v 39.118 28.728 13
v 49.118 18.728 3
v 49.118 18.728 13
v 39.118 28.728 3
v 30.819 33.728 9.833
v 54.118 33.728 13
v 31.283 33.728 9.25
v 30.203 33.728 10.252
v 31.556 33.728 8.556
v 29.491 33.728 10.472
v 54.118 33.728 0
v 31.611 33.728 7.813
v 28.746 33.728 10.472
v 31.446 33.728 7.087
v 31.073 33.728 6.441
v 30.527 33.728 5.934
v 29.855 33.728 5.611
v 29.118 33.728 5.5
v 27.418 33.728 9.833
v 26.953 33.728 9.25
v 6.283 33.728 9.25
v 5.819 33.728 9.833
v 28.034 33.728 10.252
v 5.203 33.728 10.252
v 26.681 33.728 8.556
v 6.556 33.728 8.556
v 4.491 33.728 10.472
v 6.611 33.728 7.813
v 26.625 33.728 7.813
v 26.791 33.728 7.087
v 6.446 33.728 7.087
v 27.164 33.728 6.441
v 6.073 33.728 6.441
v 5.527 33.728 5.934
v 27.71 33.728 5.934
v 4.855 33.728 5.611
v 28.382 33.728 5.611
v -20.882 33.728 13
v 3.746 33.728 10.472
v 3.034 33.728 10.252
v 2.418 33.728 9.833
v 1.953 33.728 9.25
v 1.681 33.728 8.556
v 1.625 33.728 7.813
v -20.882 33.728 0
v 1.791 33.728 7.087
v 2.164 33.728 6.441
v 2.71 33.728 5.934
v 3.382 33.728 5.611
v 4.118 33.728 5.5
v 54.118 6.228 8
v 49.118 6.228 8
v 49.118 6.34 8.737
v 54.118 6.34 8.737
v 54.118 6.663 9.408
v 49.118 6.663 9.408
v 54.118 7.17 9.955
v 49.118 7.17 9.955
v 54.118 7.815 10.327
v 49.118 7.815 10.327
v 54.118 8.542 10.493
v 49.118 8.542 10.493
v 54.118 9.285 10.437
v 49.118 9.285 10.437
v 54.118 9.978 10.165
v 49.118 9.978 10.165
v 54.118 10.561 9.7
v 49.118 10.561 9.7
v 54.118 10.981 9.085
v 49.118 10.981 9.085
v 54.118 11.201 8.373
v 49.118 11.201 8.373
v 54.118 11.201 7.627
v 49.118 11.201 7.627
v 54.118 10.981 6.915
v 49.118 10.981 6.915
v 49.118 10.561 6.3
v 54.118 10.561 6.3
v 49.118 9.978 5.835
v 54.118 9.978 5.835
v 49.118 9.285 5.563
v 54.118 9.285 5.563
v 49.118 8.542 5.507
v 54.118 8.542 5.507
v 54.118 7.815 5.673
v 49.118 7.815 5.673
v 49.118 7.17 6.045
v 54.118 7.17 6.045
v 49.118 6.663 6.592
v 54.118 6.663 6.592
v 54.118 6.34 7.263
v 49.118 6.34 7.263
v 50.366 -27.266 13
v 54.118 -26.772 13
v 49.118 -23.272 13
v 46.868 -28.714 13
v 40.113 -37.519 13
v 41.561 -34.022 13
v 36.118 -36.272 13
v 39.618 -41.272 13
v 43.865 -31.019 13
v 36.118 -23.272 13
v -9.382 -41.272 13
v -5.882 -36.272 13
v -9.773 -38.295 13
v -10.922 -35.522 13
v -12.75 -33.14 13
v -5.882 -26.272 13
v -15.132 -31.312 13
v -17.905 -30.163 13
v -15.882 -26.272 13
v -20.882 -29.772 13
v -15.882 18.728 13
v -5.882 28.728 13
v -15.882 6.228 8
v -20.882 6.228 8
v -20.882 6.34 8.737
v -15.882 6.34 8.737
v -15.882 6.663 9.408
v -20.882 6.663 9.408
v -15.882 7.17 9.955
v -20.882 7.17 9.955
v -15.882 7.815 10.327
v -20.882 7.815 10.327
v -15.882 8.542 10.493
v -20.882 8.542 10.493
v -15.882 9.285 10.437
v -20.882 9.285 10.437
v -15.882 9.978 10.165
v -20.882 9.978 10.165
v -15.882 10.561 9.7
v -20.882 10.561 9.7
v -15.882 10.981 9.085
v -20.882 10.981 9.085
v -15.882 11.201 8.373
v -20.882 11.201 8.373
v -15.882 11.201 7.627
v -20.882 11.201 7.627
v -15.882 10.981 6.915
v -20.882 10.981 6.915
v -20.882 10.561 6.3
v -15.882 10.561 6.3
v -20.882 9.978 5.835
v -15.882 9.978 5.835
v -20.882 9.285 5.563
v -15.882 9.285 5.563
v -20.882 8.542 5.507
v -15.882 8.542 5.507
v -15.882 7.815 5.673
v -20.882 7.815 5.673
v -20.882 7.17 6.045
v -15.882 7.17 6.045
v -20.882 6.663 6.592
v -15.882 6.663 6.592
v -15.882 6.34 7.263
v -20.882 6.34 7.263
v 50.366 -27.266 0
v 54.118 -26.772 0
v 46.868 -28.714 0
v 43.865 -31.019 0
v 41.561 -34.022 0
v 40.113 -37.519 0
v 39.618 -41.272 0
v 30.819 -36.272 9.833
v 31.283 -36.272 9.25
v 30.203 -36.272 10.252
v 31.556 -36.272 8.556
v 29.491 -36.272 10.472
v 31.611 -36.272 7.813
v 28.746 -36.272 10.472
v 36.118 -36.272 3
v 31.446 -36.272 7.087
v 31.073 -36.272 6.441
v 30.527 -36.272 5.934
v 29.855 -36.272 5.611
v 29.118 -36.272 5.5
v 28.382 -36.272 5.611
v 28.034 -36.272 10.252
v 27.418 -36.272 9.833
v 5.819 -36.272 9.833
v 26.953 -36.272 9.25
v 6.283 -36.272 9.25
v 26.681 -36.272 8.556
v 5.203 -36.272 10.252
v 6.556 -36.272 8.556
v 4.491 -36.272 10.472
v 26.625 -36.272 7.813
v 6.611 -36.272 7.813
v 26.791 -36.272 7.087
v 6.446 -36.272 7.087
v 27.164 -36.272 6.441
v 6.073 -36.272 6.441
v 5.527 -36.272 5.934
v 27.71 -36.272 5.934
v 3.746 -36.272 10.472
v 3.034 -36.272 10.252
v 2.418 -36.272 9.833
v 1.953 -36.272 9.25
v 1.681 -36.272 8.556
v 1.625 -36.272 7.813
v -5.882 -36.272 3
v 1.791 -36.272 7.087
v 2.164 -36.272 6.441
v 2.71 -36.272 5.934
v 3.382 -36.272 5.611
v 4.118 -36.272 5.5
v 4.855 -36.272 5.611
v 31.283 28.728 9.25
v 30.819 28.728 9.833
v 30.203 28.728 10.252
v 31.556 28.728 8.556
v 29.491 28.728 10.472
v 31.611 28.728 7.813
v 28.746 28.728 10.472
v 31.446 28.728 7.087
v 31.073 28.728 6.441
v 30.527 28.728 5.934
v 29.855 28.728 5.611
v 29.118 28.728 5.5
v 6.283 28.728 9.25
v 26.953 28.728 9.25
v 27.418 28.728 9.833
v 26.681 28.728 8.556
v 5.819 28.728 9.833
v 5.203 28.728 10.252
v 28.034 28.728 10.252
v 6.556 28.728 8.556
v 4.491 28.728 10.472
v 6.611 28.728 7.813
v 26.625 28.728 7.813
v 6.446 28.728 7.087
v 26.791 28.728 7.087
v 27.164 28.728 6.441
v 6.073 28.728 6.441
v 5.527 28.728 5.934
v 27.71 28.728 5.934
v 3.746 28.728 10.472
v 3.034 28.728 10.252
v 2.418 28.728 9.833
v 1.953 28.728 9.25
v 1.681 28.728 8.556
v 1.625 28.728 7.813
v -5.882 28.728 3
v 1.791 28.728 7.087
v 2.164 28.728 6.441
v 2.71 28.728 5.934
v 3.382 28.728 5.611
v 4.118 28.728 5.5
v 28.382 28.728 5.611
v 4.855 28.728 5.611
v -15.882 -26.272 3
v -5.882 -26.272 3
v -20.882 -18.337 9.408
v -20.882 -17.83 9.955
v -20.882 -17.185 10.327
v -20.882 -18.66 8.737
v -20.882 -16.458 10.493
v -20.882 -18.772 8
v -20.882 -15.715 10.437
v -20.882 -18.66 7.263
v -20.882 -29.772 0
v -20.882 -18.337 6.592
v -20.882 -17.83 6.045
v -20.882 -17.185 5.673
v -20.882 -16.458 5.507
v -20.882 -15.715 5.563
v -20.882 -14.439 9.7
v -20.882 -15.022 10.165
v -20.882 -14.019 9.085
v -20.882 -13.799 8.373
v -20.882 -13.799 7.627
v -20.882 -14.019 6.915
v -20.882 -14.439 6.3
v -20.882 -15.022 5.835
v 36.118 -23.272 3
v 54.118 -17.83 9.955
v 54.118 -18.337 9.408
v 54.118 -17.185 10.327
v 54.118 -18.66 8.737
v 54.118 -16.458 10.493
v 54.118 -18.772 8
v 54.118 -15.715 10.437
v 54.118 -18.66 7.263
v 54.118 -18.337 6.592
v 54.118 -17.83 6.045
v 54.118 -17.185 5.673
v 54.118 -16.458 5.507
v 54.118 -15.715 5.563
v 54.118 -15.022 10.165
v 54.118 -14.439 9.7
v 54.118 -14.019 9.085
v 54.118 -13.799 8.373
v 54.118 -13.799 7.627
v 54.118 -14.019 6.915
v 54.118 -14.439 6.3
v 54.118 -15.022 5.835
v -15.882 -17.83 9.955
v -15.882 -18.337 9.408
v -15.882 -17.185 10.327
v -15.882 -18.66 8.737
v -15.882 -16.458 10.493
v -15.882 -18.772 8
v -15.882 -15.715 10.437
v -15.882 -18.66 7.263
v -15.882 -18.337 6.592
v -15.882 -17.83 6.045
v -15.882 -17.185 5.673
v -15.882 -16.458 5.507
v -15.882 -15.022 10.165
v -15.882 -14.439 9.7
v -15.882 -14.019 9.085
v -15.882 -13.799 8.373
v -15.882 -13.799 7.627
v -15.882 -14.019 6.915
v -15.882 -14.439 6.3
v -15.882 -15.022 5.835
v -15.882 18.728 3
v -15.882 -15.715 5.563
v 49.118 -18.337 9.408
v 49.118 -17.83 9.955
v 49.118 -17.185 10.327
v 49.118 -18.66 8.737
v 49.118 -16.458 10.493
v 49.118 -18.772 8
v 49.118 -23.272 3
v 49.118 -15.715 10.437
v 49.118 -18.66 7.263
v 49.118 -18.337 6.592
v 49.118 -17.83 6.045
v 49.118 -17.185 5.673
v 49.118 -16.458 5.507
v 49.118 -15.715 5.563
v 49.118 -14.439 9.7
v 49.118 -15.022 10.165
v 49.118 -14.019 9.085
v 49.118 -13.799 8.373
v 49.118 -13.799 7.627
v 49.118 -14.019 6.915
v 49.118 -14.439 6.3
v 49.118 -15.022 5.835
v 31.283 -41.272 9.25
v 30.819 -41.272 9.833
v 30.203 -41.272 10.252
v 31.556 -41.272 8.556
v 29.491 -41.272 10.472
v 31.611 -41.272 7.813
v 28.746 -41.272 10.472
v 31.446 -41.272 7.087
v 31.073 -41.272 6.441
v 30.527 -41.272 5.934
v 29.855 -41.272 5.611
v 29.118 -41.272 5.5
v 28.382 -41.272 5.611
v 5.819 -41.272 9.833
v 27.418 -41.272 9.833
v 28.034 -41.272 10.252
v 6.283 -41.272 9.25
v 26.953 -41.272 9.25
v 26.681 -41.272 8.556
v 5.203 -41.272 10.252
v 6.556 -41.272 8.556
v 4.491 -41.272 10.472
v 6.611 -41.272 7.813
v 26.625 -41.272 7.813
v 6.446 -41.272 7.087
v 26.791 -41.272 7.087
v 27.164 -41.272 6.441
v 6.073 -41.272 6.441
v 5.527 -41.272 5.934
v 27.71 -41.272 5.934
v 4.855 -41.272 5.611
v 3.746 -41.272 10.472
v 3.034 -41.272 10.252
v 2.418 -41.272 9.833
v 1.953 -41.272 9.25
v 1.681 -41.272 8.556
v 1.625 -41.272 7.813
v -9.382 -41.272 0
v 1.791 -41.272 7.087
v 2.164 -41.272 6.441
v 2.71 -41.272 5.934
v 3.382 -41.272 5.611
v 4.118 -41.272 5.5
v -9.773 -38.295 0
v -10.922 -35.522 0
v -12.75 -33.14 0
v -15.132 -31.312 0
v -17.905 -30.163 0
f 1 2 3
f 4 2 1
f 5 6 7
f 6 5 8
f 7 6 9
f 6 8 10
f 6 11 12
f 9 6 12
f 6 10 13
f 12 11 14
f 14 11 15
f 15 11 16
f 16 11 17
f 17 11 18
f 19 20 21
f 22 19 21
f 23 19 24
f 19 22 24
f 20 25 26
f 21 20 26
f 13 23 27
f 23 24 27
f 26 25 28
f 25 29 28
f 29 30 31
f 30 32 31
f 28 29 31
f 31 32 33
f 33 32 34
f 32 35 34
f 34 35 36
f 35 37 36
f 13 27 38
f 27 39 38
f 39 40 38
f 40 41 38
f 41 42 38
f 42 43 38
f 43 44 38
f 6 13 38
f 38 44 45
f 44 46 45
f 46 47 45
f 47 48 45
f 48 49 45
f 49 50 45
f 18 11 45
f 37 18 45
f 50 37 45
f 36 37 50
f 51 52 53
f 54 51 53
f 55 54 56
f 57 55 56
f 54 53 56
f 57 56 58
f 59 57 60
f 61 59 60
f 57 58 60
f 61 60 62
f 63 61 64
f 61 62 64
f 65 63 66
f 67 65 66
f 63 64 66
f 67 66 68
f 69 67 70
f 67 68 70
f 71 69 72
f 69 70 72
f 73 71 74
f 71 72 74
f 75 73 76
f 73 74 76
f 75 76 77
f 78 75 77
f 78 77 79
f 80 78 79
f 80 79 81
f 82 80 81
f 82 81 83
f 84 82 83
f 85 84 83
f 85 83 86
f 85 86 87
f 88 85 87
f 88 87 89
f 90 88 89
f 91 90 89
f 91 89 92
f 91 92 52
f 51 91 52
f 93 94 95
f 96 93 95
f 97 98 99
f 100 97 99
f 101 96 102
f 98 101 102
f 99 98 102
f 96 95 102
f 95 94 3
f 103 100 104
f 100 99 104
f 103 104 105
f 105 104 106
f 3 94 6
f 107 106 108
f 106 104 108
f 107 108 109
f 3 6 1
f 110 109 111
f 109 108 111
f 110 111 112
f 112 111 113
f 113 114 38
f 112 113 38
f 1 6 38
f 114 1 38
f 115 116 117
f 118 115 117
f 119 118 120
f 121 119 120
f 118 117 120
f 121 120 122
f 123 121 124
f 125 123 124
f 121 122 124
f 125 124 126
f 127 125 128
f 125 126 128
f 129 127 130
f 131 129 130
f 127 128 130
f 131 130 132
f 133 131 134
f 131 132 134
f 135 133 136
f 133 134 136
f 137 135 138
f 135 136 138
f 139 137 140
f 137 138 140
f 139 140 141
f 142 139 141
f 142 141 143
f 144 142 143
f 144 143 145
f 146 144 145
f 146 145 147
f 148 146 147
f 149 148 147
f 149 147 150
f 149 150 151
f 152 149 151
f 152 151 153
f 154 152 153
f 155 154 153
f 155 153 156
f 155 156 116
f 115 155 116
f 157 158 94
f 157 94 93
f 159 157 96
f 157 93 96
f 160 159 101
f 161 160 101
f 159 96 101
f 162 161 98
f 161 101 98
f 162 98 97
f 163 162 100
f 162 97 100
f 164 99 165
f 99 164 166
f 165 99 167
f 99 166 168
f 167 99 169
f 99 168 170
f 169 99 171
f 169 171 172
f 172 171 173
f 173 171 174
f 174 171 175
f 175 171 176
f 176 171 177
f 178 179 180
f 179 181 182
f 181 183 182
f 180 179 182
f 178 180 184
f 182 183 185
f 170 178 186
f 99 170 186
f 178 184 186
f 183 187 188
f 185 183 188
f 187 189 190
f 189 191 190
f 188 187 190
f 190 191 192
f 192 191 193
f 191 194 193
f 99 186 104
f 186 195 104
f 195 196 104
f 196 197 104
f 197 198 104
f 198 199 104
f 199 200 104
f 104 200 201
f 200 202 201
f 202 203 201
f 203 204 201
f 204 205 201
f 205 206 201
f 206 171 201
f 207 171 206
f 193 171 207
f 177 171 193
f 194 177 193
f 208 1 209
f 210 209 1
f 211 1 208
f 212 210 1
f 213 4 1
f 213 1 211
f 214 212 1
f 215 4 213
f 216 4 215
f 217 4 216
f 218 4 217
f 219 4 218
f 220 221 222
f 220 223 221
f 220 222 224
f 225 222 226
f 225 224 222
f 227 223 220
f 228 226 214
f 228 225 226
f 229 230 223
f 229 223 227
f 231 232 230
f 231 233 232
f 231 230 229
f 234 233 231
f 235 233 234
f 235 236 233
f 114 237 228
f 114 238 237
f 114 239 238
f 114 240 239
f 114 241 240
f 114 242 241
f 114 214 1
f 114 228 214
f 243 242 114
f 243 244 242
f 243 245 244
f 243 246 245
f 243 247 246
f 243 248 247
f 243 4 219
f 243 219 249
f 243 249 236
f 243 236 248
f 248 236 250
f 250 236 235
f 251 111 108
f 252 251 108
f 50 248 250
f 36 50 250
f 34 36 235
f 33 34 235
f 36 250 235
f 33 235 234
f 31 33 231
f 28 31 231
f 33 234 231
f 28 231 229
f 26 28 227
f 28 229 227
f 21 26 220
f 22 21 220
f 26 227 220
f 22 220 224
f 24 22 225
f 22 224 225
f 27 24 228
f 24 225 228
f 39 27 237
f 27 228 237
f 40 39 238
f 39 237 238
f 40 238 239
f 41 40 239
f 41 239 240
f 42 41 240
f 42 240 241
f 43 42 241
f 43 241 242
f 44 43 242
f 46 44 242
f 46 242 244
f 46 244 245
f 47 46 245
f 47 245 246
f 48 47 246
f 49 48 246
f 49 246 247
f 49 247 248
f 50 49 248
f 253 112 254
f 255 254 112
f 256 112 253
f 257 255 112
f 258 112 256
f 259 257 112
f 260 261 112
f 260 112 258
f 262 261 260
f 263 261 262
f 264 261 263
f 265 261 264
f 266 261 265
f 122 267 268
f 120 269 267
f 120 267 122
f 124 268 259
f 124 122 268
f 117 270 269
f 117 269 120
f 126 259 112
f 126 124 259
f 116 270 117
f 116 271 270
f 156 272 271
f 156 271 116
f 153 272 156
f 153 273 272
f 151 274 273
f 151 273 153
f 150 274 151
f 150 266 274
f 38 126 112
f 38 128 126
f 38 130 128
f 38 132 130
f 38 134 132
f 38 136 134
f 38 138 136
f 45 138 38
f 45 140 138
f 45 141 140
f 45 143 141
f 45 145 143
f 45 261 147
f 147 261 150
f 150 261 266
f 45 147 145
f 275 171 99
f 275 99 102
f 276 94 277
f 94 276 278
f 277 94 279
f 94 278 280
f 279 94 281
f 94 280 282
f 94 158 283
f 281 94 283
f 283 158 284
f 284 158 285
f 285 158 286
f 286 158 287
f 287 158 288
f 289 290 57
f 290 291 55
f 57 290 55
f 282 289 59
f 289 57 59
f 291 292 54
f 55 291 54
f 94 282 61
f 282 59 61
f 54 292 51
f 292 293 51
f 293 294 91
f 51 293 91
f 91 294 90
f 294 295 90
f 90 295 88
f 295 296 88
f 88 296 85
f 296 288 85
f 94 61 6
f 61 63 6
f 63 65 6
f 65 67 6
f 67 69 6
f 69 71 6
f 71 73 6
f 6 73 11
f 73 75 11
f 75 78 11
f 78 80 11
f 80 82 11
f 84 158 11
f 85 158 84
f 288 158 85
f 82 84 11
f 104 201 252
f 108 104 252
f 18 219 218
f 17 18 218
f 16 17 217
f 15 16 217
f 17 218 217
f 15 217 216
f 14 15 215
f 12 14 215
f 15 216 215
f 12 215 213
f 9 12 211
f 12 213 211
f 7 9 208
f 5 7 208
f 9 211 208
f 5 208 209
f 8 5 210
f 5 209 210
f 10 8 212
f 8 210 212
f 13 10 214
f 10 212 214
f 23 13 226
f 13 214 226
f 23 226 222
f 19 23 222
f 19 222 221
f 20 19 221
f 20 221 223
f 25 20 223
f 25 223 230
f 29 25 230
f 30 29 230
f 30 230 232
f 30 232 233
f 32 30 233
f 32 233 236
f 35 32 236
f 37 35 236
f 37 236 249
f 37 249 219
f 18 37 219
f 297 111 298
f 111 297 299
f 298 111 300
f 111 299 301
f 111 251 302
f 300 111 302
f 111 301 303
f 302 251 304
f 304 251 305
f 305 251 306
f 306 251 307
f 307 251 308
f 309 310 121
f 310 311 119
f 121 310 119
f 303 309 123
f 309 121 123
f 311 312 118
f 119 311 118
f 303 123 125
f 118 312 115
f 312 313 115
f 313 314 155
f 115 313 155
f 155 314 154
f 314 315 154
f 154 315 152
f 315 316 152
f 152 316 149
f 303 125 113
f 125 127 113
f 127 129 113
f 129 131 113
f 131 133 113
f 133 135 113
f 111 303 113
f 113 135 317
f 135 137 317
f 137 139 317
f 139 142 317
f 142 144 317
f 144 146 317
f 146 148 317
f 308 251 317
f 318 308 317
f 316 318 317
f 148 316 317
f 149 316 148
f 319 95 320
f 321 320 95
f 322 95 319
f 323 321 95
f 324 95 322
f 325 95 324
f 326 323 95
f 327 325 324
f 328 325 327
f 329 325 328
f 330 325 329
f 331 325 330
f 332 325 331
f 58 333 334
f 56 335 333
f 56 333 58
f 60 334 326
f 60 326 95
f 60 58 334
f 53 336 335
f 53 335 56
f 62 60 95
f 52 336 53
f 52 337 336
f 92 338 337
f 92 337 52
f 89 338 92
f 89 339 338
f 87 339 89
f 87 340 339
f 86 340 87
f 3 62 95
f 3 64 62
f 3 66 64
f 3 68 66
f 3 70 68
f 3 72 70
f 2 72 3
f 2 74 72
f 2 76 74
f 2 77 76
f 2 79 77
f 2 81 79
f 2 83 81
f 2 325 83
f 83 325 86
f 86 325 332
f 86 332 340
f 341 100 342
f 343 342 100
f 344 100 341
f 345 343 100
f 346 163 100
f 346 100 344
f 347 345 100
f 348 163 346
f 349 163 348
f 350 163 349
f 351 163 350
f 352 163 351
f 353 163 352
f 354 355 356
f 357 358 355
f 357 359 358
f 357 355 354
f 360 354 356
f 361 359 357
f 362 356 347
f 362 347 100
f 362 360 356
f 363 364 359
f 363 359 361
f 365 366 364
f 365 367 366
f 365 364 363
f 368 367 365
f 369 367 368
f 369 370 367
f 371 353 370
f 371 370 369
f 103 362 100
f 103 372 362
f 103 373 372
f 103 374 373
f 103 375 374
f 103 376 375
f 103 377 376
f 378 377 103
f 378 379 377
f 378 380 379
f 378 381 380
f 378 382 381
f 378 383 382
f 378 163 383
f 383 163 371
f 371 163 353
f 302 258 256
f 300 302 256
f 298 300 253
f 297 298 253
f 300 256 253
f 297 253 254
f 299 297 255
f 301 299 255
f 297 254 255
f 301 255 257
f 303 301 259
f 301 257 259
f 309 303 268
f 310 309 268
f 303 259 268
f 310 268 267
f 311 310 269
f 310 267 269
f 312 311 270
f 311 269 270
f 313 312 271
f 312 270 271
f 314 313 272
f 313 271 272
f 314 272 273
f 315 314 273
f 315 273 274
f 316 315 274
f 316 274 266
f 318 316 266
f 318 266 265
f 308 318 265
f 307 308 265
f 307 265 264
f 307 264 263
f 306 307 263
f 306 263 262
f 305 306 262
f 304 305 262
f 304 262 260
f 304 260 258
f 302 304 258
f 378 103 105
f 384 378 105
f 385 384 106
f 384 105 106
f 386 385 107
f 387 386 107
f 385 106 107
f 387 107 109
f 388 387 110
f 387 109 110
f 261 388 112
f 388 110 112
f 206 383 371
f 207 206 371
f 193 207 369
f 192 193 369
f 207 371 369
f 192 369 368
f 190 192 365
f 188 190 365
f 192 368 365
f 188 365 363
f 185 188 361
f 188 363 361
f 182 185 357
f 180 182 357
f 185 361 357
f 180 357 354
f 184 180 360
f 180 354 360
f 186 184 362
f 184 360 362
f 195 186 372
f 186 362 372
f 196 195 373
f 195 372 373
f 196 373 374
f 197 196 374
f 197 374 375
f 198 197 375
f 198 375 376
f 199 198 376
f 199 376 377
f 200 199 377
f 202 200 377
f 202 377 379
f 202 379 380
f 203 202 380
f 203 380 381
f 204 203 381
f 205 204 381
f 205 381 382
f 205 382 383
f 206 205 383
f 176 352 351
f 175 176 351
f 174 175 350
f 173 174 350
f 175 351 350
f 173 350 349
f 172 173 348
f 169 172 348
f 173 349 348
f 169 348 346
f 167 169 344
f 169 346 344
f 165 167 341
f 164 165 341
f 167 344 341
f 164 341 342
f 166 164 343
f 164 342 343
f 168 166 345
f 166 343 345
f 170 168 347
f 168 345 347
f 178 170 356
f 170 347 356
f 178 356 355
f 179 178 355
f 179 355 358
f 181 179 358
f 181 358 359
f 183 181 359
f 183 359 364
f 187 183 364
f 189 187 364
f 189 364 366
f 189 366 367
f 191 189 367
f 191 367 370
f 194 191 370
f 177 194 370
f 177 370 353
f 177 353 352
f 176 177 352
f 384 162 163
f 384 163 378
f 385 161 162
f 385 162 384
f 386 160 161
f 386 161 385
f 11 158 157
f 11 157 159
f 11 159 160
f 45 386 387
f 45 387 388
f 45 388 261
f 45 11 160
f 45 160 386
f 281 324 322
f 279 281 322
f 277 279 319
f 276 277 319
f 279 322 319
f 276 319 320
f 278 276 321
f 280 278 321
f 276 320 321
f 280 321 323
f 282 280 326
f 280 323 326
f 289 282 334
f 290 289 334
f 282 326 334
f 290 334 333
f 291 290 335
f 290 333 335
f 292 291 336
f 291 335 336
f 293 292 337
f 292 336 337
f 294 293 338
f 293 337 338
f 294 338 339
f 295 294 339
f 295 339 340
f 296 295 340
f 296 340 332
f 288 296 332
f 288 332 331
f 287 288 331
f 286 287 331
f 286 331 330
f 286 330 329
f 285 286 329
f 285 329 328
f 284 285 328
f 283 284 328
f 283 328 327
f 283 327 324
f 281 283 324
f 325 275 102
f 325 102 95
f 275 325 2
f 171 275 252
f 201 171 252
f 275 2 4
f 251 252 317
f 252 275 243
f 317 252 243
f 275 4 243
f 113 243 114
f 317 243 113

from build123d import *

# Parameters (mm, degrees)
BOSS_EXTRU_1_DEPTH        = 13
COQUE1_T                  = -5
COQUE1_THICKNESS_2_FACE_W = 65
COQUE1_THICKNESS_2_FACE_H = 65
COQUE1_THICKNESS_2_DEPTH  = 2
ENL_V_MAT_EXTRU_1_REACH   = 88.587
ESQUISSE2_R               = 2.5
ENL_V_MAT_EXTRU_2_REACH   = 95.396
ESQUISSE3_R               = 2.5
ESQUISSE4_W               = 18
ESQUISSE4_H               = 18
ESQUISSE4_W_2             = 15
ESQUISSE4_H_2             = 15
BOSS_EXTRU_2_DEPTH        = 10
ESQUISSE5_R               = 11.5
ESQUISSE5_R_2             = 14.5
ENL_V_MAT_EXTRU_3_DEPTH   = 13


with BuildPart() as part:
    # Esquisse1 → Boss.-Extru.1 (new body)
    with BuildSketch(Plane.XY):
        Polygon((44.118436308, 33.728448276), (54.118436308, 33.728448276), (54.118436308, 23.728448276), (54.118436308, -41.271551724), (-20.881563692, -41.271551724), (-20.881563692, 33.728448276), align=None)
    extrude(amount=BOSS_EXTRU_1_DEPTH)

    # Coque1
    coque1_openings = [part.faces().sort_by_distance(p)[0] for p in [
        (16.618436308, -3.771551724, 13),
    ]]
    offset(amount=COQUE1_T, openings=coque1_openings, kind=Kind.INTERSECTION)

    # Coque1 thickness 2 face (on inner face of the shell) → Coque1 thickness 2 (cut)
    with BuildSketch(Plane(origin=(16.618436308, -3.771551724, 5), x_dir=(-1, 0, 0), z_dir=(0, 0, -1))):
        Rectangle(COQUE1_THICKNESS_2_FACE_W, COQUE1_THICKNESS_2_FACE_H)
    extrude(amount=COQUE1_THICKNESS_2_DEPTH, mode=Mode.SUBTRACT)

    # Enlèv. mat.-Extru.1: up to this face of the body (flat: up to its plane)
    enl_v_mat_extru_1_end = Plane(part.part.faces().sort_by_distance((54.118436308, -3.771551724, 6.5))[0])
    # Esquisse2 → Enlèv. mat.-Extru.1 (cut, up to the picked face)
    with BuildSketch(Plane.ZY.offset(20.881563692), mode=Mode.PRIVATE) as enl_v_mat_extru_1_sk1:
        with Locations(Location((8, -16.271551724, 0), (0, 0, 270))):
            Circle(ESQUISSE2_R)
    enl_v_mat_extru_1_tool1 = split(extrude(enl_v_mat_extru_1_sk1.sketch, amount=-ENL_V_MAT_EXTRU_1_REACH, mode=Mode.PRIVATE), bisect_by=enl_v_mat_extru_1_end, keep=Keep.BOTH, mode=Mode.PRIVATE)
    # Esquisse2 → Enlèv. mat.-Extru.1 (cut, up to the picked face)
    with BuildSketch(Plane.ZY.offset(20.881563692), mode=Mode.PRIVATE) as enl_v_mat_extru_1_sk2:
        with Locations(Location((8, 8.728448276, 0), (0, 0, 270))):
            Circle(ESQUISSE2_R)
    enl_v_mat_extru_1_tool2 = split(extrude(enl_v_mat_extru_1_sk2.sketch, amount=-ENL_V_MAT_EXTRU_1_REACH, mode=Mode.PRIVATE), bisect_by=enl_v_mat_extru_1_end, keep=Keep.BOTH, mode=Mode.PRIVATE)
    add(enl_v_mat_extru_1_tool1.solids().sort_by(Axis((-20.881564, -16.271552, 8), (1, 0, 0)))[0], mode=Mode.SUBTRACT)
    add(enl_v_mat_extru_1_tool2.solids().sort_by(Axis((-20.881564, 8.728448, 8), (1, 0, 0)))[0], mode=Mode.SUBTRACT)

    # Enlèv. mat.-Extru.2: up to this face of the body (flat: up to its plane)
    enl_v_mat_extru_2_end = Plane(part.part.faces().sort_by_distance((16.618436308, 33.728448276, 6.5))[0])
    # Esquisse3 → Enlèv. mat.-Extru.2 (cut, up to the picked face)
    with BuildSketch(Plane.XZ.offset(41.271551724), mode=Mode.PRIVATE) as enl_v_mat_extru_2_sk1:
        with Locations(Location((4.118436308, 8, 0), (0, 0, 270))):
            Circle(ESQUISSE3_R)
    enl_v_mat_extru_2_tool1 = split(extrude(enl_v_mat_extru_2_sk1.sketch, amount=-ENL_V_MAT_EXTRU_2_REACH, mode=Mode.PRIVATE), bisect_by=enl_v_mat_extru_2_end, keep=Keep.BOTH, mode=Mode.PRIVATE)
    # Esquisse3 → Enlèv. mat.-Extru.2 (cut, up to the picked face)
    with BuildSketch(Plane.XZ.offset(41.271551724), mode=Mode.PRIVATE) as enl_v_mat_extru_2_sk2:
        with Locations(Location((29.118436308, 8, 0), (0, 0, 270))):
            Circle(ESQUISSE3_R)
    enl_v_mat_extru_2_tool2 = split(extrude(enl_v_mat_extru_2_sk2.sketch, amount=-ENL_V_MAT_EXTRU_2_REACH, mode=Mode.PRIVATE), bisect_by=enl_v_mat_extru_2_end, keep=Keep.BOTH, mode=Mode.PRIVATE)
    add(enl_v_mat_extru_2_tool1.solids().sort_by(Axis((4.118436, -41.271552, 8), (0, 1, 0)))[0], mode=Mode.SUBTRACT)
    add(enl_v_mat_extru_2_tool2.solids().sort_by(Axis((29.118436, -41.271552, 8), (0, 1, 0)))[0], mode=Mode.SUBTRACT)

    # Esquisse4 → Boss.-Extru.2 (add)
    with BuildSketch(Plane.XY.offset(3)):
        Polygon((-5.881563692, 28.728448276), (-15.881563692, 18.728448276), (-15.881563692, 28.728448276), align=None)
        Polygon((49.118436308, 28.728448276), (49.118436308, 18.728448276), (39.118436308, 28.728448276), align=None)
        with Locations((45.118436308, -32.271551724)):
            Rectangle(ESQUISSE4_W, ESQUISSE4_H)
        with Locations((-13.381563692, -33.771551724)):
            Rectangle(ESQUISSE4_W_2, ESQUISSE4_H_2)
    extrude(amount=BOSS_EXTRU_2_DEPTH)

    # Esquisse5 → Enlèv. mat.-Extru.3 (cut)
    with BuildSketch(Plane.XY.offset(13)):
        with Locations((-20.881563692, -41.271551724)):
            Circle(ESQUISSE5_R)
        with Locations((54.118436308, -41.271551724)):
            Circle(ESQUISSE5_R_2)
    extrude(amount=-ENL_V_MAT_EXTRU_3_DEPTH, mode=Mode.SUBTRACT)


solid = part.part
